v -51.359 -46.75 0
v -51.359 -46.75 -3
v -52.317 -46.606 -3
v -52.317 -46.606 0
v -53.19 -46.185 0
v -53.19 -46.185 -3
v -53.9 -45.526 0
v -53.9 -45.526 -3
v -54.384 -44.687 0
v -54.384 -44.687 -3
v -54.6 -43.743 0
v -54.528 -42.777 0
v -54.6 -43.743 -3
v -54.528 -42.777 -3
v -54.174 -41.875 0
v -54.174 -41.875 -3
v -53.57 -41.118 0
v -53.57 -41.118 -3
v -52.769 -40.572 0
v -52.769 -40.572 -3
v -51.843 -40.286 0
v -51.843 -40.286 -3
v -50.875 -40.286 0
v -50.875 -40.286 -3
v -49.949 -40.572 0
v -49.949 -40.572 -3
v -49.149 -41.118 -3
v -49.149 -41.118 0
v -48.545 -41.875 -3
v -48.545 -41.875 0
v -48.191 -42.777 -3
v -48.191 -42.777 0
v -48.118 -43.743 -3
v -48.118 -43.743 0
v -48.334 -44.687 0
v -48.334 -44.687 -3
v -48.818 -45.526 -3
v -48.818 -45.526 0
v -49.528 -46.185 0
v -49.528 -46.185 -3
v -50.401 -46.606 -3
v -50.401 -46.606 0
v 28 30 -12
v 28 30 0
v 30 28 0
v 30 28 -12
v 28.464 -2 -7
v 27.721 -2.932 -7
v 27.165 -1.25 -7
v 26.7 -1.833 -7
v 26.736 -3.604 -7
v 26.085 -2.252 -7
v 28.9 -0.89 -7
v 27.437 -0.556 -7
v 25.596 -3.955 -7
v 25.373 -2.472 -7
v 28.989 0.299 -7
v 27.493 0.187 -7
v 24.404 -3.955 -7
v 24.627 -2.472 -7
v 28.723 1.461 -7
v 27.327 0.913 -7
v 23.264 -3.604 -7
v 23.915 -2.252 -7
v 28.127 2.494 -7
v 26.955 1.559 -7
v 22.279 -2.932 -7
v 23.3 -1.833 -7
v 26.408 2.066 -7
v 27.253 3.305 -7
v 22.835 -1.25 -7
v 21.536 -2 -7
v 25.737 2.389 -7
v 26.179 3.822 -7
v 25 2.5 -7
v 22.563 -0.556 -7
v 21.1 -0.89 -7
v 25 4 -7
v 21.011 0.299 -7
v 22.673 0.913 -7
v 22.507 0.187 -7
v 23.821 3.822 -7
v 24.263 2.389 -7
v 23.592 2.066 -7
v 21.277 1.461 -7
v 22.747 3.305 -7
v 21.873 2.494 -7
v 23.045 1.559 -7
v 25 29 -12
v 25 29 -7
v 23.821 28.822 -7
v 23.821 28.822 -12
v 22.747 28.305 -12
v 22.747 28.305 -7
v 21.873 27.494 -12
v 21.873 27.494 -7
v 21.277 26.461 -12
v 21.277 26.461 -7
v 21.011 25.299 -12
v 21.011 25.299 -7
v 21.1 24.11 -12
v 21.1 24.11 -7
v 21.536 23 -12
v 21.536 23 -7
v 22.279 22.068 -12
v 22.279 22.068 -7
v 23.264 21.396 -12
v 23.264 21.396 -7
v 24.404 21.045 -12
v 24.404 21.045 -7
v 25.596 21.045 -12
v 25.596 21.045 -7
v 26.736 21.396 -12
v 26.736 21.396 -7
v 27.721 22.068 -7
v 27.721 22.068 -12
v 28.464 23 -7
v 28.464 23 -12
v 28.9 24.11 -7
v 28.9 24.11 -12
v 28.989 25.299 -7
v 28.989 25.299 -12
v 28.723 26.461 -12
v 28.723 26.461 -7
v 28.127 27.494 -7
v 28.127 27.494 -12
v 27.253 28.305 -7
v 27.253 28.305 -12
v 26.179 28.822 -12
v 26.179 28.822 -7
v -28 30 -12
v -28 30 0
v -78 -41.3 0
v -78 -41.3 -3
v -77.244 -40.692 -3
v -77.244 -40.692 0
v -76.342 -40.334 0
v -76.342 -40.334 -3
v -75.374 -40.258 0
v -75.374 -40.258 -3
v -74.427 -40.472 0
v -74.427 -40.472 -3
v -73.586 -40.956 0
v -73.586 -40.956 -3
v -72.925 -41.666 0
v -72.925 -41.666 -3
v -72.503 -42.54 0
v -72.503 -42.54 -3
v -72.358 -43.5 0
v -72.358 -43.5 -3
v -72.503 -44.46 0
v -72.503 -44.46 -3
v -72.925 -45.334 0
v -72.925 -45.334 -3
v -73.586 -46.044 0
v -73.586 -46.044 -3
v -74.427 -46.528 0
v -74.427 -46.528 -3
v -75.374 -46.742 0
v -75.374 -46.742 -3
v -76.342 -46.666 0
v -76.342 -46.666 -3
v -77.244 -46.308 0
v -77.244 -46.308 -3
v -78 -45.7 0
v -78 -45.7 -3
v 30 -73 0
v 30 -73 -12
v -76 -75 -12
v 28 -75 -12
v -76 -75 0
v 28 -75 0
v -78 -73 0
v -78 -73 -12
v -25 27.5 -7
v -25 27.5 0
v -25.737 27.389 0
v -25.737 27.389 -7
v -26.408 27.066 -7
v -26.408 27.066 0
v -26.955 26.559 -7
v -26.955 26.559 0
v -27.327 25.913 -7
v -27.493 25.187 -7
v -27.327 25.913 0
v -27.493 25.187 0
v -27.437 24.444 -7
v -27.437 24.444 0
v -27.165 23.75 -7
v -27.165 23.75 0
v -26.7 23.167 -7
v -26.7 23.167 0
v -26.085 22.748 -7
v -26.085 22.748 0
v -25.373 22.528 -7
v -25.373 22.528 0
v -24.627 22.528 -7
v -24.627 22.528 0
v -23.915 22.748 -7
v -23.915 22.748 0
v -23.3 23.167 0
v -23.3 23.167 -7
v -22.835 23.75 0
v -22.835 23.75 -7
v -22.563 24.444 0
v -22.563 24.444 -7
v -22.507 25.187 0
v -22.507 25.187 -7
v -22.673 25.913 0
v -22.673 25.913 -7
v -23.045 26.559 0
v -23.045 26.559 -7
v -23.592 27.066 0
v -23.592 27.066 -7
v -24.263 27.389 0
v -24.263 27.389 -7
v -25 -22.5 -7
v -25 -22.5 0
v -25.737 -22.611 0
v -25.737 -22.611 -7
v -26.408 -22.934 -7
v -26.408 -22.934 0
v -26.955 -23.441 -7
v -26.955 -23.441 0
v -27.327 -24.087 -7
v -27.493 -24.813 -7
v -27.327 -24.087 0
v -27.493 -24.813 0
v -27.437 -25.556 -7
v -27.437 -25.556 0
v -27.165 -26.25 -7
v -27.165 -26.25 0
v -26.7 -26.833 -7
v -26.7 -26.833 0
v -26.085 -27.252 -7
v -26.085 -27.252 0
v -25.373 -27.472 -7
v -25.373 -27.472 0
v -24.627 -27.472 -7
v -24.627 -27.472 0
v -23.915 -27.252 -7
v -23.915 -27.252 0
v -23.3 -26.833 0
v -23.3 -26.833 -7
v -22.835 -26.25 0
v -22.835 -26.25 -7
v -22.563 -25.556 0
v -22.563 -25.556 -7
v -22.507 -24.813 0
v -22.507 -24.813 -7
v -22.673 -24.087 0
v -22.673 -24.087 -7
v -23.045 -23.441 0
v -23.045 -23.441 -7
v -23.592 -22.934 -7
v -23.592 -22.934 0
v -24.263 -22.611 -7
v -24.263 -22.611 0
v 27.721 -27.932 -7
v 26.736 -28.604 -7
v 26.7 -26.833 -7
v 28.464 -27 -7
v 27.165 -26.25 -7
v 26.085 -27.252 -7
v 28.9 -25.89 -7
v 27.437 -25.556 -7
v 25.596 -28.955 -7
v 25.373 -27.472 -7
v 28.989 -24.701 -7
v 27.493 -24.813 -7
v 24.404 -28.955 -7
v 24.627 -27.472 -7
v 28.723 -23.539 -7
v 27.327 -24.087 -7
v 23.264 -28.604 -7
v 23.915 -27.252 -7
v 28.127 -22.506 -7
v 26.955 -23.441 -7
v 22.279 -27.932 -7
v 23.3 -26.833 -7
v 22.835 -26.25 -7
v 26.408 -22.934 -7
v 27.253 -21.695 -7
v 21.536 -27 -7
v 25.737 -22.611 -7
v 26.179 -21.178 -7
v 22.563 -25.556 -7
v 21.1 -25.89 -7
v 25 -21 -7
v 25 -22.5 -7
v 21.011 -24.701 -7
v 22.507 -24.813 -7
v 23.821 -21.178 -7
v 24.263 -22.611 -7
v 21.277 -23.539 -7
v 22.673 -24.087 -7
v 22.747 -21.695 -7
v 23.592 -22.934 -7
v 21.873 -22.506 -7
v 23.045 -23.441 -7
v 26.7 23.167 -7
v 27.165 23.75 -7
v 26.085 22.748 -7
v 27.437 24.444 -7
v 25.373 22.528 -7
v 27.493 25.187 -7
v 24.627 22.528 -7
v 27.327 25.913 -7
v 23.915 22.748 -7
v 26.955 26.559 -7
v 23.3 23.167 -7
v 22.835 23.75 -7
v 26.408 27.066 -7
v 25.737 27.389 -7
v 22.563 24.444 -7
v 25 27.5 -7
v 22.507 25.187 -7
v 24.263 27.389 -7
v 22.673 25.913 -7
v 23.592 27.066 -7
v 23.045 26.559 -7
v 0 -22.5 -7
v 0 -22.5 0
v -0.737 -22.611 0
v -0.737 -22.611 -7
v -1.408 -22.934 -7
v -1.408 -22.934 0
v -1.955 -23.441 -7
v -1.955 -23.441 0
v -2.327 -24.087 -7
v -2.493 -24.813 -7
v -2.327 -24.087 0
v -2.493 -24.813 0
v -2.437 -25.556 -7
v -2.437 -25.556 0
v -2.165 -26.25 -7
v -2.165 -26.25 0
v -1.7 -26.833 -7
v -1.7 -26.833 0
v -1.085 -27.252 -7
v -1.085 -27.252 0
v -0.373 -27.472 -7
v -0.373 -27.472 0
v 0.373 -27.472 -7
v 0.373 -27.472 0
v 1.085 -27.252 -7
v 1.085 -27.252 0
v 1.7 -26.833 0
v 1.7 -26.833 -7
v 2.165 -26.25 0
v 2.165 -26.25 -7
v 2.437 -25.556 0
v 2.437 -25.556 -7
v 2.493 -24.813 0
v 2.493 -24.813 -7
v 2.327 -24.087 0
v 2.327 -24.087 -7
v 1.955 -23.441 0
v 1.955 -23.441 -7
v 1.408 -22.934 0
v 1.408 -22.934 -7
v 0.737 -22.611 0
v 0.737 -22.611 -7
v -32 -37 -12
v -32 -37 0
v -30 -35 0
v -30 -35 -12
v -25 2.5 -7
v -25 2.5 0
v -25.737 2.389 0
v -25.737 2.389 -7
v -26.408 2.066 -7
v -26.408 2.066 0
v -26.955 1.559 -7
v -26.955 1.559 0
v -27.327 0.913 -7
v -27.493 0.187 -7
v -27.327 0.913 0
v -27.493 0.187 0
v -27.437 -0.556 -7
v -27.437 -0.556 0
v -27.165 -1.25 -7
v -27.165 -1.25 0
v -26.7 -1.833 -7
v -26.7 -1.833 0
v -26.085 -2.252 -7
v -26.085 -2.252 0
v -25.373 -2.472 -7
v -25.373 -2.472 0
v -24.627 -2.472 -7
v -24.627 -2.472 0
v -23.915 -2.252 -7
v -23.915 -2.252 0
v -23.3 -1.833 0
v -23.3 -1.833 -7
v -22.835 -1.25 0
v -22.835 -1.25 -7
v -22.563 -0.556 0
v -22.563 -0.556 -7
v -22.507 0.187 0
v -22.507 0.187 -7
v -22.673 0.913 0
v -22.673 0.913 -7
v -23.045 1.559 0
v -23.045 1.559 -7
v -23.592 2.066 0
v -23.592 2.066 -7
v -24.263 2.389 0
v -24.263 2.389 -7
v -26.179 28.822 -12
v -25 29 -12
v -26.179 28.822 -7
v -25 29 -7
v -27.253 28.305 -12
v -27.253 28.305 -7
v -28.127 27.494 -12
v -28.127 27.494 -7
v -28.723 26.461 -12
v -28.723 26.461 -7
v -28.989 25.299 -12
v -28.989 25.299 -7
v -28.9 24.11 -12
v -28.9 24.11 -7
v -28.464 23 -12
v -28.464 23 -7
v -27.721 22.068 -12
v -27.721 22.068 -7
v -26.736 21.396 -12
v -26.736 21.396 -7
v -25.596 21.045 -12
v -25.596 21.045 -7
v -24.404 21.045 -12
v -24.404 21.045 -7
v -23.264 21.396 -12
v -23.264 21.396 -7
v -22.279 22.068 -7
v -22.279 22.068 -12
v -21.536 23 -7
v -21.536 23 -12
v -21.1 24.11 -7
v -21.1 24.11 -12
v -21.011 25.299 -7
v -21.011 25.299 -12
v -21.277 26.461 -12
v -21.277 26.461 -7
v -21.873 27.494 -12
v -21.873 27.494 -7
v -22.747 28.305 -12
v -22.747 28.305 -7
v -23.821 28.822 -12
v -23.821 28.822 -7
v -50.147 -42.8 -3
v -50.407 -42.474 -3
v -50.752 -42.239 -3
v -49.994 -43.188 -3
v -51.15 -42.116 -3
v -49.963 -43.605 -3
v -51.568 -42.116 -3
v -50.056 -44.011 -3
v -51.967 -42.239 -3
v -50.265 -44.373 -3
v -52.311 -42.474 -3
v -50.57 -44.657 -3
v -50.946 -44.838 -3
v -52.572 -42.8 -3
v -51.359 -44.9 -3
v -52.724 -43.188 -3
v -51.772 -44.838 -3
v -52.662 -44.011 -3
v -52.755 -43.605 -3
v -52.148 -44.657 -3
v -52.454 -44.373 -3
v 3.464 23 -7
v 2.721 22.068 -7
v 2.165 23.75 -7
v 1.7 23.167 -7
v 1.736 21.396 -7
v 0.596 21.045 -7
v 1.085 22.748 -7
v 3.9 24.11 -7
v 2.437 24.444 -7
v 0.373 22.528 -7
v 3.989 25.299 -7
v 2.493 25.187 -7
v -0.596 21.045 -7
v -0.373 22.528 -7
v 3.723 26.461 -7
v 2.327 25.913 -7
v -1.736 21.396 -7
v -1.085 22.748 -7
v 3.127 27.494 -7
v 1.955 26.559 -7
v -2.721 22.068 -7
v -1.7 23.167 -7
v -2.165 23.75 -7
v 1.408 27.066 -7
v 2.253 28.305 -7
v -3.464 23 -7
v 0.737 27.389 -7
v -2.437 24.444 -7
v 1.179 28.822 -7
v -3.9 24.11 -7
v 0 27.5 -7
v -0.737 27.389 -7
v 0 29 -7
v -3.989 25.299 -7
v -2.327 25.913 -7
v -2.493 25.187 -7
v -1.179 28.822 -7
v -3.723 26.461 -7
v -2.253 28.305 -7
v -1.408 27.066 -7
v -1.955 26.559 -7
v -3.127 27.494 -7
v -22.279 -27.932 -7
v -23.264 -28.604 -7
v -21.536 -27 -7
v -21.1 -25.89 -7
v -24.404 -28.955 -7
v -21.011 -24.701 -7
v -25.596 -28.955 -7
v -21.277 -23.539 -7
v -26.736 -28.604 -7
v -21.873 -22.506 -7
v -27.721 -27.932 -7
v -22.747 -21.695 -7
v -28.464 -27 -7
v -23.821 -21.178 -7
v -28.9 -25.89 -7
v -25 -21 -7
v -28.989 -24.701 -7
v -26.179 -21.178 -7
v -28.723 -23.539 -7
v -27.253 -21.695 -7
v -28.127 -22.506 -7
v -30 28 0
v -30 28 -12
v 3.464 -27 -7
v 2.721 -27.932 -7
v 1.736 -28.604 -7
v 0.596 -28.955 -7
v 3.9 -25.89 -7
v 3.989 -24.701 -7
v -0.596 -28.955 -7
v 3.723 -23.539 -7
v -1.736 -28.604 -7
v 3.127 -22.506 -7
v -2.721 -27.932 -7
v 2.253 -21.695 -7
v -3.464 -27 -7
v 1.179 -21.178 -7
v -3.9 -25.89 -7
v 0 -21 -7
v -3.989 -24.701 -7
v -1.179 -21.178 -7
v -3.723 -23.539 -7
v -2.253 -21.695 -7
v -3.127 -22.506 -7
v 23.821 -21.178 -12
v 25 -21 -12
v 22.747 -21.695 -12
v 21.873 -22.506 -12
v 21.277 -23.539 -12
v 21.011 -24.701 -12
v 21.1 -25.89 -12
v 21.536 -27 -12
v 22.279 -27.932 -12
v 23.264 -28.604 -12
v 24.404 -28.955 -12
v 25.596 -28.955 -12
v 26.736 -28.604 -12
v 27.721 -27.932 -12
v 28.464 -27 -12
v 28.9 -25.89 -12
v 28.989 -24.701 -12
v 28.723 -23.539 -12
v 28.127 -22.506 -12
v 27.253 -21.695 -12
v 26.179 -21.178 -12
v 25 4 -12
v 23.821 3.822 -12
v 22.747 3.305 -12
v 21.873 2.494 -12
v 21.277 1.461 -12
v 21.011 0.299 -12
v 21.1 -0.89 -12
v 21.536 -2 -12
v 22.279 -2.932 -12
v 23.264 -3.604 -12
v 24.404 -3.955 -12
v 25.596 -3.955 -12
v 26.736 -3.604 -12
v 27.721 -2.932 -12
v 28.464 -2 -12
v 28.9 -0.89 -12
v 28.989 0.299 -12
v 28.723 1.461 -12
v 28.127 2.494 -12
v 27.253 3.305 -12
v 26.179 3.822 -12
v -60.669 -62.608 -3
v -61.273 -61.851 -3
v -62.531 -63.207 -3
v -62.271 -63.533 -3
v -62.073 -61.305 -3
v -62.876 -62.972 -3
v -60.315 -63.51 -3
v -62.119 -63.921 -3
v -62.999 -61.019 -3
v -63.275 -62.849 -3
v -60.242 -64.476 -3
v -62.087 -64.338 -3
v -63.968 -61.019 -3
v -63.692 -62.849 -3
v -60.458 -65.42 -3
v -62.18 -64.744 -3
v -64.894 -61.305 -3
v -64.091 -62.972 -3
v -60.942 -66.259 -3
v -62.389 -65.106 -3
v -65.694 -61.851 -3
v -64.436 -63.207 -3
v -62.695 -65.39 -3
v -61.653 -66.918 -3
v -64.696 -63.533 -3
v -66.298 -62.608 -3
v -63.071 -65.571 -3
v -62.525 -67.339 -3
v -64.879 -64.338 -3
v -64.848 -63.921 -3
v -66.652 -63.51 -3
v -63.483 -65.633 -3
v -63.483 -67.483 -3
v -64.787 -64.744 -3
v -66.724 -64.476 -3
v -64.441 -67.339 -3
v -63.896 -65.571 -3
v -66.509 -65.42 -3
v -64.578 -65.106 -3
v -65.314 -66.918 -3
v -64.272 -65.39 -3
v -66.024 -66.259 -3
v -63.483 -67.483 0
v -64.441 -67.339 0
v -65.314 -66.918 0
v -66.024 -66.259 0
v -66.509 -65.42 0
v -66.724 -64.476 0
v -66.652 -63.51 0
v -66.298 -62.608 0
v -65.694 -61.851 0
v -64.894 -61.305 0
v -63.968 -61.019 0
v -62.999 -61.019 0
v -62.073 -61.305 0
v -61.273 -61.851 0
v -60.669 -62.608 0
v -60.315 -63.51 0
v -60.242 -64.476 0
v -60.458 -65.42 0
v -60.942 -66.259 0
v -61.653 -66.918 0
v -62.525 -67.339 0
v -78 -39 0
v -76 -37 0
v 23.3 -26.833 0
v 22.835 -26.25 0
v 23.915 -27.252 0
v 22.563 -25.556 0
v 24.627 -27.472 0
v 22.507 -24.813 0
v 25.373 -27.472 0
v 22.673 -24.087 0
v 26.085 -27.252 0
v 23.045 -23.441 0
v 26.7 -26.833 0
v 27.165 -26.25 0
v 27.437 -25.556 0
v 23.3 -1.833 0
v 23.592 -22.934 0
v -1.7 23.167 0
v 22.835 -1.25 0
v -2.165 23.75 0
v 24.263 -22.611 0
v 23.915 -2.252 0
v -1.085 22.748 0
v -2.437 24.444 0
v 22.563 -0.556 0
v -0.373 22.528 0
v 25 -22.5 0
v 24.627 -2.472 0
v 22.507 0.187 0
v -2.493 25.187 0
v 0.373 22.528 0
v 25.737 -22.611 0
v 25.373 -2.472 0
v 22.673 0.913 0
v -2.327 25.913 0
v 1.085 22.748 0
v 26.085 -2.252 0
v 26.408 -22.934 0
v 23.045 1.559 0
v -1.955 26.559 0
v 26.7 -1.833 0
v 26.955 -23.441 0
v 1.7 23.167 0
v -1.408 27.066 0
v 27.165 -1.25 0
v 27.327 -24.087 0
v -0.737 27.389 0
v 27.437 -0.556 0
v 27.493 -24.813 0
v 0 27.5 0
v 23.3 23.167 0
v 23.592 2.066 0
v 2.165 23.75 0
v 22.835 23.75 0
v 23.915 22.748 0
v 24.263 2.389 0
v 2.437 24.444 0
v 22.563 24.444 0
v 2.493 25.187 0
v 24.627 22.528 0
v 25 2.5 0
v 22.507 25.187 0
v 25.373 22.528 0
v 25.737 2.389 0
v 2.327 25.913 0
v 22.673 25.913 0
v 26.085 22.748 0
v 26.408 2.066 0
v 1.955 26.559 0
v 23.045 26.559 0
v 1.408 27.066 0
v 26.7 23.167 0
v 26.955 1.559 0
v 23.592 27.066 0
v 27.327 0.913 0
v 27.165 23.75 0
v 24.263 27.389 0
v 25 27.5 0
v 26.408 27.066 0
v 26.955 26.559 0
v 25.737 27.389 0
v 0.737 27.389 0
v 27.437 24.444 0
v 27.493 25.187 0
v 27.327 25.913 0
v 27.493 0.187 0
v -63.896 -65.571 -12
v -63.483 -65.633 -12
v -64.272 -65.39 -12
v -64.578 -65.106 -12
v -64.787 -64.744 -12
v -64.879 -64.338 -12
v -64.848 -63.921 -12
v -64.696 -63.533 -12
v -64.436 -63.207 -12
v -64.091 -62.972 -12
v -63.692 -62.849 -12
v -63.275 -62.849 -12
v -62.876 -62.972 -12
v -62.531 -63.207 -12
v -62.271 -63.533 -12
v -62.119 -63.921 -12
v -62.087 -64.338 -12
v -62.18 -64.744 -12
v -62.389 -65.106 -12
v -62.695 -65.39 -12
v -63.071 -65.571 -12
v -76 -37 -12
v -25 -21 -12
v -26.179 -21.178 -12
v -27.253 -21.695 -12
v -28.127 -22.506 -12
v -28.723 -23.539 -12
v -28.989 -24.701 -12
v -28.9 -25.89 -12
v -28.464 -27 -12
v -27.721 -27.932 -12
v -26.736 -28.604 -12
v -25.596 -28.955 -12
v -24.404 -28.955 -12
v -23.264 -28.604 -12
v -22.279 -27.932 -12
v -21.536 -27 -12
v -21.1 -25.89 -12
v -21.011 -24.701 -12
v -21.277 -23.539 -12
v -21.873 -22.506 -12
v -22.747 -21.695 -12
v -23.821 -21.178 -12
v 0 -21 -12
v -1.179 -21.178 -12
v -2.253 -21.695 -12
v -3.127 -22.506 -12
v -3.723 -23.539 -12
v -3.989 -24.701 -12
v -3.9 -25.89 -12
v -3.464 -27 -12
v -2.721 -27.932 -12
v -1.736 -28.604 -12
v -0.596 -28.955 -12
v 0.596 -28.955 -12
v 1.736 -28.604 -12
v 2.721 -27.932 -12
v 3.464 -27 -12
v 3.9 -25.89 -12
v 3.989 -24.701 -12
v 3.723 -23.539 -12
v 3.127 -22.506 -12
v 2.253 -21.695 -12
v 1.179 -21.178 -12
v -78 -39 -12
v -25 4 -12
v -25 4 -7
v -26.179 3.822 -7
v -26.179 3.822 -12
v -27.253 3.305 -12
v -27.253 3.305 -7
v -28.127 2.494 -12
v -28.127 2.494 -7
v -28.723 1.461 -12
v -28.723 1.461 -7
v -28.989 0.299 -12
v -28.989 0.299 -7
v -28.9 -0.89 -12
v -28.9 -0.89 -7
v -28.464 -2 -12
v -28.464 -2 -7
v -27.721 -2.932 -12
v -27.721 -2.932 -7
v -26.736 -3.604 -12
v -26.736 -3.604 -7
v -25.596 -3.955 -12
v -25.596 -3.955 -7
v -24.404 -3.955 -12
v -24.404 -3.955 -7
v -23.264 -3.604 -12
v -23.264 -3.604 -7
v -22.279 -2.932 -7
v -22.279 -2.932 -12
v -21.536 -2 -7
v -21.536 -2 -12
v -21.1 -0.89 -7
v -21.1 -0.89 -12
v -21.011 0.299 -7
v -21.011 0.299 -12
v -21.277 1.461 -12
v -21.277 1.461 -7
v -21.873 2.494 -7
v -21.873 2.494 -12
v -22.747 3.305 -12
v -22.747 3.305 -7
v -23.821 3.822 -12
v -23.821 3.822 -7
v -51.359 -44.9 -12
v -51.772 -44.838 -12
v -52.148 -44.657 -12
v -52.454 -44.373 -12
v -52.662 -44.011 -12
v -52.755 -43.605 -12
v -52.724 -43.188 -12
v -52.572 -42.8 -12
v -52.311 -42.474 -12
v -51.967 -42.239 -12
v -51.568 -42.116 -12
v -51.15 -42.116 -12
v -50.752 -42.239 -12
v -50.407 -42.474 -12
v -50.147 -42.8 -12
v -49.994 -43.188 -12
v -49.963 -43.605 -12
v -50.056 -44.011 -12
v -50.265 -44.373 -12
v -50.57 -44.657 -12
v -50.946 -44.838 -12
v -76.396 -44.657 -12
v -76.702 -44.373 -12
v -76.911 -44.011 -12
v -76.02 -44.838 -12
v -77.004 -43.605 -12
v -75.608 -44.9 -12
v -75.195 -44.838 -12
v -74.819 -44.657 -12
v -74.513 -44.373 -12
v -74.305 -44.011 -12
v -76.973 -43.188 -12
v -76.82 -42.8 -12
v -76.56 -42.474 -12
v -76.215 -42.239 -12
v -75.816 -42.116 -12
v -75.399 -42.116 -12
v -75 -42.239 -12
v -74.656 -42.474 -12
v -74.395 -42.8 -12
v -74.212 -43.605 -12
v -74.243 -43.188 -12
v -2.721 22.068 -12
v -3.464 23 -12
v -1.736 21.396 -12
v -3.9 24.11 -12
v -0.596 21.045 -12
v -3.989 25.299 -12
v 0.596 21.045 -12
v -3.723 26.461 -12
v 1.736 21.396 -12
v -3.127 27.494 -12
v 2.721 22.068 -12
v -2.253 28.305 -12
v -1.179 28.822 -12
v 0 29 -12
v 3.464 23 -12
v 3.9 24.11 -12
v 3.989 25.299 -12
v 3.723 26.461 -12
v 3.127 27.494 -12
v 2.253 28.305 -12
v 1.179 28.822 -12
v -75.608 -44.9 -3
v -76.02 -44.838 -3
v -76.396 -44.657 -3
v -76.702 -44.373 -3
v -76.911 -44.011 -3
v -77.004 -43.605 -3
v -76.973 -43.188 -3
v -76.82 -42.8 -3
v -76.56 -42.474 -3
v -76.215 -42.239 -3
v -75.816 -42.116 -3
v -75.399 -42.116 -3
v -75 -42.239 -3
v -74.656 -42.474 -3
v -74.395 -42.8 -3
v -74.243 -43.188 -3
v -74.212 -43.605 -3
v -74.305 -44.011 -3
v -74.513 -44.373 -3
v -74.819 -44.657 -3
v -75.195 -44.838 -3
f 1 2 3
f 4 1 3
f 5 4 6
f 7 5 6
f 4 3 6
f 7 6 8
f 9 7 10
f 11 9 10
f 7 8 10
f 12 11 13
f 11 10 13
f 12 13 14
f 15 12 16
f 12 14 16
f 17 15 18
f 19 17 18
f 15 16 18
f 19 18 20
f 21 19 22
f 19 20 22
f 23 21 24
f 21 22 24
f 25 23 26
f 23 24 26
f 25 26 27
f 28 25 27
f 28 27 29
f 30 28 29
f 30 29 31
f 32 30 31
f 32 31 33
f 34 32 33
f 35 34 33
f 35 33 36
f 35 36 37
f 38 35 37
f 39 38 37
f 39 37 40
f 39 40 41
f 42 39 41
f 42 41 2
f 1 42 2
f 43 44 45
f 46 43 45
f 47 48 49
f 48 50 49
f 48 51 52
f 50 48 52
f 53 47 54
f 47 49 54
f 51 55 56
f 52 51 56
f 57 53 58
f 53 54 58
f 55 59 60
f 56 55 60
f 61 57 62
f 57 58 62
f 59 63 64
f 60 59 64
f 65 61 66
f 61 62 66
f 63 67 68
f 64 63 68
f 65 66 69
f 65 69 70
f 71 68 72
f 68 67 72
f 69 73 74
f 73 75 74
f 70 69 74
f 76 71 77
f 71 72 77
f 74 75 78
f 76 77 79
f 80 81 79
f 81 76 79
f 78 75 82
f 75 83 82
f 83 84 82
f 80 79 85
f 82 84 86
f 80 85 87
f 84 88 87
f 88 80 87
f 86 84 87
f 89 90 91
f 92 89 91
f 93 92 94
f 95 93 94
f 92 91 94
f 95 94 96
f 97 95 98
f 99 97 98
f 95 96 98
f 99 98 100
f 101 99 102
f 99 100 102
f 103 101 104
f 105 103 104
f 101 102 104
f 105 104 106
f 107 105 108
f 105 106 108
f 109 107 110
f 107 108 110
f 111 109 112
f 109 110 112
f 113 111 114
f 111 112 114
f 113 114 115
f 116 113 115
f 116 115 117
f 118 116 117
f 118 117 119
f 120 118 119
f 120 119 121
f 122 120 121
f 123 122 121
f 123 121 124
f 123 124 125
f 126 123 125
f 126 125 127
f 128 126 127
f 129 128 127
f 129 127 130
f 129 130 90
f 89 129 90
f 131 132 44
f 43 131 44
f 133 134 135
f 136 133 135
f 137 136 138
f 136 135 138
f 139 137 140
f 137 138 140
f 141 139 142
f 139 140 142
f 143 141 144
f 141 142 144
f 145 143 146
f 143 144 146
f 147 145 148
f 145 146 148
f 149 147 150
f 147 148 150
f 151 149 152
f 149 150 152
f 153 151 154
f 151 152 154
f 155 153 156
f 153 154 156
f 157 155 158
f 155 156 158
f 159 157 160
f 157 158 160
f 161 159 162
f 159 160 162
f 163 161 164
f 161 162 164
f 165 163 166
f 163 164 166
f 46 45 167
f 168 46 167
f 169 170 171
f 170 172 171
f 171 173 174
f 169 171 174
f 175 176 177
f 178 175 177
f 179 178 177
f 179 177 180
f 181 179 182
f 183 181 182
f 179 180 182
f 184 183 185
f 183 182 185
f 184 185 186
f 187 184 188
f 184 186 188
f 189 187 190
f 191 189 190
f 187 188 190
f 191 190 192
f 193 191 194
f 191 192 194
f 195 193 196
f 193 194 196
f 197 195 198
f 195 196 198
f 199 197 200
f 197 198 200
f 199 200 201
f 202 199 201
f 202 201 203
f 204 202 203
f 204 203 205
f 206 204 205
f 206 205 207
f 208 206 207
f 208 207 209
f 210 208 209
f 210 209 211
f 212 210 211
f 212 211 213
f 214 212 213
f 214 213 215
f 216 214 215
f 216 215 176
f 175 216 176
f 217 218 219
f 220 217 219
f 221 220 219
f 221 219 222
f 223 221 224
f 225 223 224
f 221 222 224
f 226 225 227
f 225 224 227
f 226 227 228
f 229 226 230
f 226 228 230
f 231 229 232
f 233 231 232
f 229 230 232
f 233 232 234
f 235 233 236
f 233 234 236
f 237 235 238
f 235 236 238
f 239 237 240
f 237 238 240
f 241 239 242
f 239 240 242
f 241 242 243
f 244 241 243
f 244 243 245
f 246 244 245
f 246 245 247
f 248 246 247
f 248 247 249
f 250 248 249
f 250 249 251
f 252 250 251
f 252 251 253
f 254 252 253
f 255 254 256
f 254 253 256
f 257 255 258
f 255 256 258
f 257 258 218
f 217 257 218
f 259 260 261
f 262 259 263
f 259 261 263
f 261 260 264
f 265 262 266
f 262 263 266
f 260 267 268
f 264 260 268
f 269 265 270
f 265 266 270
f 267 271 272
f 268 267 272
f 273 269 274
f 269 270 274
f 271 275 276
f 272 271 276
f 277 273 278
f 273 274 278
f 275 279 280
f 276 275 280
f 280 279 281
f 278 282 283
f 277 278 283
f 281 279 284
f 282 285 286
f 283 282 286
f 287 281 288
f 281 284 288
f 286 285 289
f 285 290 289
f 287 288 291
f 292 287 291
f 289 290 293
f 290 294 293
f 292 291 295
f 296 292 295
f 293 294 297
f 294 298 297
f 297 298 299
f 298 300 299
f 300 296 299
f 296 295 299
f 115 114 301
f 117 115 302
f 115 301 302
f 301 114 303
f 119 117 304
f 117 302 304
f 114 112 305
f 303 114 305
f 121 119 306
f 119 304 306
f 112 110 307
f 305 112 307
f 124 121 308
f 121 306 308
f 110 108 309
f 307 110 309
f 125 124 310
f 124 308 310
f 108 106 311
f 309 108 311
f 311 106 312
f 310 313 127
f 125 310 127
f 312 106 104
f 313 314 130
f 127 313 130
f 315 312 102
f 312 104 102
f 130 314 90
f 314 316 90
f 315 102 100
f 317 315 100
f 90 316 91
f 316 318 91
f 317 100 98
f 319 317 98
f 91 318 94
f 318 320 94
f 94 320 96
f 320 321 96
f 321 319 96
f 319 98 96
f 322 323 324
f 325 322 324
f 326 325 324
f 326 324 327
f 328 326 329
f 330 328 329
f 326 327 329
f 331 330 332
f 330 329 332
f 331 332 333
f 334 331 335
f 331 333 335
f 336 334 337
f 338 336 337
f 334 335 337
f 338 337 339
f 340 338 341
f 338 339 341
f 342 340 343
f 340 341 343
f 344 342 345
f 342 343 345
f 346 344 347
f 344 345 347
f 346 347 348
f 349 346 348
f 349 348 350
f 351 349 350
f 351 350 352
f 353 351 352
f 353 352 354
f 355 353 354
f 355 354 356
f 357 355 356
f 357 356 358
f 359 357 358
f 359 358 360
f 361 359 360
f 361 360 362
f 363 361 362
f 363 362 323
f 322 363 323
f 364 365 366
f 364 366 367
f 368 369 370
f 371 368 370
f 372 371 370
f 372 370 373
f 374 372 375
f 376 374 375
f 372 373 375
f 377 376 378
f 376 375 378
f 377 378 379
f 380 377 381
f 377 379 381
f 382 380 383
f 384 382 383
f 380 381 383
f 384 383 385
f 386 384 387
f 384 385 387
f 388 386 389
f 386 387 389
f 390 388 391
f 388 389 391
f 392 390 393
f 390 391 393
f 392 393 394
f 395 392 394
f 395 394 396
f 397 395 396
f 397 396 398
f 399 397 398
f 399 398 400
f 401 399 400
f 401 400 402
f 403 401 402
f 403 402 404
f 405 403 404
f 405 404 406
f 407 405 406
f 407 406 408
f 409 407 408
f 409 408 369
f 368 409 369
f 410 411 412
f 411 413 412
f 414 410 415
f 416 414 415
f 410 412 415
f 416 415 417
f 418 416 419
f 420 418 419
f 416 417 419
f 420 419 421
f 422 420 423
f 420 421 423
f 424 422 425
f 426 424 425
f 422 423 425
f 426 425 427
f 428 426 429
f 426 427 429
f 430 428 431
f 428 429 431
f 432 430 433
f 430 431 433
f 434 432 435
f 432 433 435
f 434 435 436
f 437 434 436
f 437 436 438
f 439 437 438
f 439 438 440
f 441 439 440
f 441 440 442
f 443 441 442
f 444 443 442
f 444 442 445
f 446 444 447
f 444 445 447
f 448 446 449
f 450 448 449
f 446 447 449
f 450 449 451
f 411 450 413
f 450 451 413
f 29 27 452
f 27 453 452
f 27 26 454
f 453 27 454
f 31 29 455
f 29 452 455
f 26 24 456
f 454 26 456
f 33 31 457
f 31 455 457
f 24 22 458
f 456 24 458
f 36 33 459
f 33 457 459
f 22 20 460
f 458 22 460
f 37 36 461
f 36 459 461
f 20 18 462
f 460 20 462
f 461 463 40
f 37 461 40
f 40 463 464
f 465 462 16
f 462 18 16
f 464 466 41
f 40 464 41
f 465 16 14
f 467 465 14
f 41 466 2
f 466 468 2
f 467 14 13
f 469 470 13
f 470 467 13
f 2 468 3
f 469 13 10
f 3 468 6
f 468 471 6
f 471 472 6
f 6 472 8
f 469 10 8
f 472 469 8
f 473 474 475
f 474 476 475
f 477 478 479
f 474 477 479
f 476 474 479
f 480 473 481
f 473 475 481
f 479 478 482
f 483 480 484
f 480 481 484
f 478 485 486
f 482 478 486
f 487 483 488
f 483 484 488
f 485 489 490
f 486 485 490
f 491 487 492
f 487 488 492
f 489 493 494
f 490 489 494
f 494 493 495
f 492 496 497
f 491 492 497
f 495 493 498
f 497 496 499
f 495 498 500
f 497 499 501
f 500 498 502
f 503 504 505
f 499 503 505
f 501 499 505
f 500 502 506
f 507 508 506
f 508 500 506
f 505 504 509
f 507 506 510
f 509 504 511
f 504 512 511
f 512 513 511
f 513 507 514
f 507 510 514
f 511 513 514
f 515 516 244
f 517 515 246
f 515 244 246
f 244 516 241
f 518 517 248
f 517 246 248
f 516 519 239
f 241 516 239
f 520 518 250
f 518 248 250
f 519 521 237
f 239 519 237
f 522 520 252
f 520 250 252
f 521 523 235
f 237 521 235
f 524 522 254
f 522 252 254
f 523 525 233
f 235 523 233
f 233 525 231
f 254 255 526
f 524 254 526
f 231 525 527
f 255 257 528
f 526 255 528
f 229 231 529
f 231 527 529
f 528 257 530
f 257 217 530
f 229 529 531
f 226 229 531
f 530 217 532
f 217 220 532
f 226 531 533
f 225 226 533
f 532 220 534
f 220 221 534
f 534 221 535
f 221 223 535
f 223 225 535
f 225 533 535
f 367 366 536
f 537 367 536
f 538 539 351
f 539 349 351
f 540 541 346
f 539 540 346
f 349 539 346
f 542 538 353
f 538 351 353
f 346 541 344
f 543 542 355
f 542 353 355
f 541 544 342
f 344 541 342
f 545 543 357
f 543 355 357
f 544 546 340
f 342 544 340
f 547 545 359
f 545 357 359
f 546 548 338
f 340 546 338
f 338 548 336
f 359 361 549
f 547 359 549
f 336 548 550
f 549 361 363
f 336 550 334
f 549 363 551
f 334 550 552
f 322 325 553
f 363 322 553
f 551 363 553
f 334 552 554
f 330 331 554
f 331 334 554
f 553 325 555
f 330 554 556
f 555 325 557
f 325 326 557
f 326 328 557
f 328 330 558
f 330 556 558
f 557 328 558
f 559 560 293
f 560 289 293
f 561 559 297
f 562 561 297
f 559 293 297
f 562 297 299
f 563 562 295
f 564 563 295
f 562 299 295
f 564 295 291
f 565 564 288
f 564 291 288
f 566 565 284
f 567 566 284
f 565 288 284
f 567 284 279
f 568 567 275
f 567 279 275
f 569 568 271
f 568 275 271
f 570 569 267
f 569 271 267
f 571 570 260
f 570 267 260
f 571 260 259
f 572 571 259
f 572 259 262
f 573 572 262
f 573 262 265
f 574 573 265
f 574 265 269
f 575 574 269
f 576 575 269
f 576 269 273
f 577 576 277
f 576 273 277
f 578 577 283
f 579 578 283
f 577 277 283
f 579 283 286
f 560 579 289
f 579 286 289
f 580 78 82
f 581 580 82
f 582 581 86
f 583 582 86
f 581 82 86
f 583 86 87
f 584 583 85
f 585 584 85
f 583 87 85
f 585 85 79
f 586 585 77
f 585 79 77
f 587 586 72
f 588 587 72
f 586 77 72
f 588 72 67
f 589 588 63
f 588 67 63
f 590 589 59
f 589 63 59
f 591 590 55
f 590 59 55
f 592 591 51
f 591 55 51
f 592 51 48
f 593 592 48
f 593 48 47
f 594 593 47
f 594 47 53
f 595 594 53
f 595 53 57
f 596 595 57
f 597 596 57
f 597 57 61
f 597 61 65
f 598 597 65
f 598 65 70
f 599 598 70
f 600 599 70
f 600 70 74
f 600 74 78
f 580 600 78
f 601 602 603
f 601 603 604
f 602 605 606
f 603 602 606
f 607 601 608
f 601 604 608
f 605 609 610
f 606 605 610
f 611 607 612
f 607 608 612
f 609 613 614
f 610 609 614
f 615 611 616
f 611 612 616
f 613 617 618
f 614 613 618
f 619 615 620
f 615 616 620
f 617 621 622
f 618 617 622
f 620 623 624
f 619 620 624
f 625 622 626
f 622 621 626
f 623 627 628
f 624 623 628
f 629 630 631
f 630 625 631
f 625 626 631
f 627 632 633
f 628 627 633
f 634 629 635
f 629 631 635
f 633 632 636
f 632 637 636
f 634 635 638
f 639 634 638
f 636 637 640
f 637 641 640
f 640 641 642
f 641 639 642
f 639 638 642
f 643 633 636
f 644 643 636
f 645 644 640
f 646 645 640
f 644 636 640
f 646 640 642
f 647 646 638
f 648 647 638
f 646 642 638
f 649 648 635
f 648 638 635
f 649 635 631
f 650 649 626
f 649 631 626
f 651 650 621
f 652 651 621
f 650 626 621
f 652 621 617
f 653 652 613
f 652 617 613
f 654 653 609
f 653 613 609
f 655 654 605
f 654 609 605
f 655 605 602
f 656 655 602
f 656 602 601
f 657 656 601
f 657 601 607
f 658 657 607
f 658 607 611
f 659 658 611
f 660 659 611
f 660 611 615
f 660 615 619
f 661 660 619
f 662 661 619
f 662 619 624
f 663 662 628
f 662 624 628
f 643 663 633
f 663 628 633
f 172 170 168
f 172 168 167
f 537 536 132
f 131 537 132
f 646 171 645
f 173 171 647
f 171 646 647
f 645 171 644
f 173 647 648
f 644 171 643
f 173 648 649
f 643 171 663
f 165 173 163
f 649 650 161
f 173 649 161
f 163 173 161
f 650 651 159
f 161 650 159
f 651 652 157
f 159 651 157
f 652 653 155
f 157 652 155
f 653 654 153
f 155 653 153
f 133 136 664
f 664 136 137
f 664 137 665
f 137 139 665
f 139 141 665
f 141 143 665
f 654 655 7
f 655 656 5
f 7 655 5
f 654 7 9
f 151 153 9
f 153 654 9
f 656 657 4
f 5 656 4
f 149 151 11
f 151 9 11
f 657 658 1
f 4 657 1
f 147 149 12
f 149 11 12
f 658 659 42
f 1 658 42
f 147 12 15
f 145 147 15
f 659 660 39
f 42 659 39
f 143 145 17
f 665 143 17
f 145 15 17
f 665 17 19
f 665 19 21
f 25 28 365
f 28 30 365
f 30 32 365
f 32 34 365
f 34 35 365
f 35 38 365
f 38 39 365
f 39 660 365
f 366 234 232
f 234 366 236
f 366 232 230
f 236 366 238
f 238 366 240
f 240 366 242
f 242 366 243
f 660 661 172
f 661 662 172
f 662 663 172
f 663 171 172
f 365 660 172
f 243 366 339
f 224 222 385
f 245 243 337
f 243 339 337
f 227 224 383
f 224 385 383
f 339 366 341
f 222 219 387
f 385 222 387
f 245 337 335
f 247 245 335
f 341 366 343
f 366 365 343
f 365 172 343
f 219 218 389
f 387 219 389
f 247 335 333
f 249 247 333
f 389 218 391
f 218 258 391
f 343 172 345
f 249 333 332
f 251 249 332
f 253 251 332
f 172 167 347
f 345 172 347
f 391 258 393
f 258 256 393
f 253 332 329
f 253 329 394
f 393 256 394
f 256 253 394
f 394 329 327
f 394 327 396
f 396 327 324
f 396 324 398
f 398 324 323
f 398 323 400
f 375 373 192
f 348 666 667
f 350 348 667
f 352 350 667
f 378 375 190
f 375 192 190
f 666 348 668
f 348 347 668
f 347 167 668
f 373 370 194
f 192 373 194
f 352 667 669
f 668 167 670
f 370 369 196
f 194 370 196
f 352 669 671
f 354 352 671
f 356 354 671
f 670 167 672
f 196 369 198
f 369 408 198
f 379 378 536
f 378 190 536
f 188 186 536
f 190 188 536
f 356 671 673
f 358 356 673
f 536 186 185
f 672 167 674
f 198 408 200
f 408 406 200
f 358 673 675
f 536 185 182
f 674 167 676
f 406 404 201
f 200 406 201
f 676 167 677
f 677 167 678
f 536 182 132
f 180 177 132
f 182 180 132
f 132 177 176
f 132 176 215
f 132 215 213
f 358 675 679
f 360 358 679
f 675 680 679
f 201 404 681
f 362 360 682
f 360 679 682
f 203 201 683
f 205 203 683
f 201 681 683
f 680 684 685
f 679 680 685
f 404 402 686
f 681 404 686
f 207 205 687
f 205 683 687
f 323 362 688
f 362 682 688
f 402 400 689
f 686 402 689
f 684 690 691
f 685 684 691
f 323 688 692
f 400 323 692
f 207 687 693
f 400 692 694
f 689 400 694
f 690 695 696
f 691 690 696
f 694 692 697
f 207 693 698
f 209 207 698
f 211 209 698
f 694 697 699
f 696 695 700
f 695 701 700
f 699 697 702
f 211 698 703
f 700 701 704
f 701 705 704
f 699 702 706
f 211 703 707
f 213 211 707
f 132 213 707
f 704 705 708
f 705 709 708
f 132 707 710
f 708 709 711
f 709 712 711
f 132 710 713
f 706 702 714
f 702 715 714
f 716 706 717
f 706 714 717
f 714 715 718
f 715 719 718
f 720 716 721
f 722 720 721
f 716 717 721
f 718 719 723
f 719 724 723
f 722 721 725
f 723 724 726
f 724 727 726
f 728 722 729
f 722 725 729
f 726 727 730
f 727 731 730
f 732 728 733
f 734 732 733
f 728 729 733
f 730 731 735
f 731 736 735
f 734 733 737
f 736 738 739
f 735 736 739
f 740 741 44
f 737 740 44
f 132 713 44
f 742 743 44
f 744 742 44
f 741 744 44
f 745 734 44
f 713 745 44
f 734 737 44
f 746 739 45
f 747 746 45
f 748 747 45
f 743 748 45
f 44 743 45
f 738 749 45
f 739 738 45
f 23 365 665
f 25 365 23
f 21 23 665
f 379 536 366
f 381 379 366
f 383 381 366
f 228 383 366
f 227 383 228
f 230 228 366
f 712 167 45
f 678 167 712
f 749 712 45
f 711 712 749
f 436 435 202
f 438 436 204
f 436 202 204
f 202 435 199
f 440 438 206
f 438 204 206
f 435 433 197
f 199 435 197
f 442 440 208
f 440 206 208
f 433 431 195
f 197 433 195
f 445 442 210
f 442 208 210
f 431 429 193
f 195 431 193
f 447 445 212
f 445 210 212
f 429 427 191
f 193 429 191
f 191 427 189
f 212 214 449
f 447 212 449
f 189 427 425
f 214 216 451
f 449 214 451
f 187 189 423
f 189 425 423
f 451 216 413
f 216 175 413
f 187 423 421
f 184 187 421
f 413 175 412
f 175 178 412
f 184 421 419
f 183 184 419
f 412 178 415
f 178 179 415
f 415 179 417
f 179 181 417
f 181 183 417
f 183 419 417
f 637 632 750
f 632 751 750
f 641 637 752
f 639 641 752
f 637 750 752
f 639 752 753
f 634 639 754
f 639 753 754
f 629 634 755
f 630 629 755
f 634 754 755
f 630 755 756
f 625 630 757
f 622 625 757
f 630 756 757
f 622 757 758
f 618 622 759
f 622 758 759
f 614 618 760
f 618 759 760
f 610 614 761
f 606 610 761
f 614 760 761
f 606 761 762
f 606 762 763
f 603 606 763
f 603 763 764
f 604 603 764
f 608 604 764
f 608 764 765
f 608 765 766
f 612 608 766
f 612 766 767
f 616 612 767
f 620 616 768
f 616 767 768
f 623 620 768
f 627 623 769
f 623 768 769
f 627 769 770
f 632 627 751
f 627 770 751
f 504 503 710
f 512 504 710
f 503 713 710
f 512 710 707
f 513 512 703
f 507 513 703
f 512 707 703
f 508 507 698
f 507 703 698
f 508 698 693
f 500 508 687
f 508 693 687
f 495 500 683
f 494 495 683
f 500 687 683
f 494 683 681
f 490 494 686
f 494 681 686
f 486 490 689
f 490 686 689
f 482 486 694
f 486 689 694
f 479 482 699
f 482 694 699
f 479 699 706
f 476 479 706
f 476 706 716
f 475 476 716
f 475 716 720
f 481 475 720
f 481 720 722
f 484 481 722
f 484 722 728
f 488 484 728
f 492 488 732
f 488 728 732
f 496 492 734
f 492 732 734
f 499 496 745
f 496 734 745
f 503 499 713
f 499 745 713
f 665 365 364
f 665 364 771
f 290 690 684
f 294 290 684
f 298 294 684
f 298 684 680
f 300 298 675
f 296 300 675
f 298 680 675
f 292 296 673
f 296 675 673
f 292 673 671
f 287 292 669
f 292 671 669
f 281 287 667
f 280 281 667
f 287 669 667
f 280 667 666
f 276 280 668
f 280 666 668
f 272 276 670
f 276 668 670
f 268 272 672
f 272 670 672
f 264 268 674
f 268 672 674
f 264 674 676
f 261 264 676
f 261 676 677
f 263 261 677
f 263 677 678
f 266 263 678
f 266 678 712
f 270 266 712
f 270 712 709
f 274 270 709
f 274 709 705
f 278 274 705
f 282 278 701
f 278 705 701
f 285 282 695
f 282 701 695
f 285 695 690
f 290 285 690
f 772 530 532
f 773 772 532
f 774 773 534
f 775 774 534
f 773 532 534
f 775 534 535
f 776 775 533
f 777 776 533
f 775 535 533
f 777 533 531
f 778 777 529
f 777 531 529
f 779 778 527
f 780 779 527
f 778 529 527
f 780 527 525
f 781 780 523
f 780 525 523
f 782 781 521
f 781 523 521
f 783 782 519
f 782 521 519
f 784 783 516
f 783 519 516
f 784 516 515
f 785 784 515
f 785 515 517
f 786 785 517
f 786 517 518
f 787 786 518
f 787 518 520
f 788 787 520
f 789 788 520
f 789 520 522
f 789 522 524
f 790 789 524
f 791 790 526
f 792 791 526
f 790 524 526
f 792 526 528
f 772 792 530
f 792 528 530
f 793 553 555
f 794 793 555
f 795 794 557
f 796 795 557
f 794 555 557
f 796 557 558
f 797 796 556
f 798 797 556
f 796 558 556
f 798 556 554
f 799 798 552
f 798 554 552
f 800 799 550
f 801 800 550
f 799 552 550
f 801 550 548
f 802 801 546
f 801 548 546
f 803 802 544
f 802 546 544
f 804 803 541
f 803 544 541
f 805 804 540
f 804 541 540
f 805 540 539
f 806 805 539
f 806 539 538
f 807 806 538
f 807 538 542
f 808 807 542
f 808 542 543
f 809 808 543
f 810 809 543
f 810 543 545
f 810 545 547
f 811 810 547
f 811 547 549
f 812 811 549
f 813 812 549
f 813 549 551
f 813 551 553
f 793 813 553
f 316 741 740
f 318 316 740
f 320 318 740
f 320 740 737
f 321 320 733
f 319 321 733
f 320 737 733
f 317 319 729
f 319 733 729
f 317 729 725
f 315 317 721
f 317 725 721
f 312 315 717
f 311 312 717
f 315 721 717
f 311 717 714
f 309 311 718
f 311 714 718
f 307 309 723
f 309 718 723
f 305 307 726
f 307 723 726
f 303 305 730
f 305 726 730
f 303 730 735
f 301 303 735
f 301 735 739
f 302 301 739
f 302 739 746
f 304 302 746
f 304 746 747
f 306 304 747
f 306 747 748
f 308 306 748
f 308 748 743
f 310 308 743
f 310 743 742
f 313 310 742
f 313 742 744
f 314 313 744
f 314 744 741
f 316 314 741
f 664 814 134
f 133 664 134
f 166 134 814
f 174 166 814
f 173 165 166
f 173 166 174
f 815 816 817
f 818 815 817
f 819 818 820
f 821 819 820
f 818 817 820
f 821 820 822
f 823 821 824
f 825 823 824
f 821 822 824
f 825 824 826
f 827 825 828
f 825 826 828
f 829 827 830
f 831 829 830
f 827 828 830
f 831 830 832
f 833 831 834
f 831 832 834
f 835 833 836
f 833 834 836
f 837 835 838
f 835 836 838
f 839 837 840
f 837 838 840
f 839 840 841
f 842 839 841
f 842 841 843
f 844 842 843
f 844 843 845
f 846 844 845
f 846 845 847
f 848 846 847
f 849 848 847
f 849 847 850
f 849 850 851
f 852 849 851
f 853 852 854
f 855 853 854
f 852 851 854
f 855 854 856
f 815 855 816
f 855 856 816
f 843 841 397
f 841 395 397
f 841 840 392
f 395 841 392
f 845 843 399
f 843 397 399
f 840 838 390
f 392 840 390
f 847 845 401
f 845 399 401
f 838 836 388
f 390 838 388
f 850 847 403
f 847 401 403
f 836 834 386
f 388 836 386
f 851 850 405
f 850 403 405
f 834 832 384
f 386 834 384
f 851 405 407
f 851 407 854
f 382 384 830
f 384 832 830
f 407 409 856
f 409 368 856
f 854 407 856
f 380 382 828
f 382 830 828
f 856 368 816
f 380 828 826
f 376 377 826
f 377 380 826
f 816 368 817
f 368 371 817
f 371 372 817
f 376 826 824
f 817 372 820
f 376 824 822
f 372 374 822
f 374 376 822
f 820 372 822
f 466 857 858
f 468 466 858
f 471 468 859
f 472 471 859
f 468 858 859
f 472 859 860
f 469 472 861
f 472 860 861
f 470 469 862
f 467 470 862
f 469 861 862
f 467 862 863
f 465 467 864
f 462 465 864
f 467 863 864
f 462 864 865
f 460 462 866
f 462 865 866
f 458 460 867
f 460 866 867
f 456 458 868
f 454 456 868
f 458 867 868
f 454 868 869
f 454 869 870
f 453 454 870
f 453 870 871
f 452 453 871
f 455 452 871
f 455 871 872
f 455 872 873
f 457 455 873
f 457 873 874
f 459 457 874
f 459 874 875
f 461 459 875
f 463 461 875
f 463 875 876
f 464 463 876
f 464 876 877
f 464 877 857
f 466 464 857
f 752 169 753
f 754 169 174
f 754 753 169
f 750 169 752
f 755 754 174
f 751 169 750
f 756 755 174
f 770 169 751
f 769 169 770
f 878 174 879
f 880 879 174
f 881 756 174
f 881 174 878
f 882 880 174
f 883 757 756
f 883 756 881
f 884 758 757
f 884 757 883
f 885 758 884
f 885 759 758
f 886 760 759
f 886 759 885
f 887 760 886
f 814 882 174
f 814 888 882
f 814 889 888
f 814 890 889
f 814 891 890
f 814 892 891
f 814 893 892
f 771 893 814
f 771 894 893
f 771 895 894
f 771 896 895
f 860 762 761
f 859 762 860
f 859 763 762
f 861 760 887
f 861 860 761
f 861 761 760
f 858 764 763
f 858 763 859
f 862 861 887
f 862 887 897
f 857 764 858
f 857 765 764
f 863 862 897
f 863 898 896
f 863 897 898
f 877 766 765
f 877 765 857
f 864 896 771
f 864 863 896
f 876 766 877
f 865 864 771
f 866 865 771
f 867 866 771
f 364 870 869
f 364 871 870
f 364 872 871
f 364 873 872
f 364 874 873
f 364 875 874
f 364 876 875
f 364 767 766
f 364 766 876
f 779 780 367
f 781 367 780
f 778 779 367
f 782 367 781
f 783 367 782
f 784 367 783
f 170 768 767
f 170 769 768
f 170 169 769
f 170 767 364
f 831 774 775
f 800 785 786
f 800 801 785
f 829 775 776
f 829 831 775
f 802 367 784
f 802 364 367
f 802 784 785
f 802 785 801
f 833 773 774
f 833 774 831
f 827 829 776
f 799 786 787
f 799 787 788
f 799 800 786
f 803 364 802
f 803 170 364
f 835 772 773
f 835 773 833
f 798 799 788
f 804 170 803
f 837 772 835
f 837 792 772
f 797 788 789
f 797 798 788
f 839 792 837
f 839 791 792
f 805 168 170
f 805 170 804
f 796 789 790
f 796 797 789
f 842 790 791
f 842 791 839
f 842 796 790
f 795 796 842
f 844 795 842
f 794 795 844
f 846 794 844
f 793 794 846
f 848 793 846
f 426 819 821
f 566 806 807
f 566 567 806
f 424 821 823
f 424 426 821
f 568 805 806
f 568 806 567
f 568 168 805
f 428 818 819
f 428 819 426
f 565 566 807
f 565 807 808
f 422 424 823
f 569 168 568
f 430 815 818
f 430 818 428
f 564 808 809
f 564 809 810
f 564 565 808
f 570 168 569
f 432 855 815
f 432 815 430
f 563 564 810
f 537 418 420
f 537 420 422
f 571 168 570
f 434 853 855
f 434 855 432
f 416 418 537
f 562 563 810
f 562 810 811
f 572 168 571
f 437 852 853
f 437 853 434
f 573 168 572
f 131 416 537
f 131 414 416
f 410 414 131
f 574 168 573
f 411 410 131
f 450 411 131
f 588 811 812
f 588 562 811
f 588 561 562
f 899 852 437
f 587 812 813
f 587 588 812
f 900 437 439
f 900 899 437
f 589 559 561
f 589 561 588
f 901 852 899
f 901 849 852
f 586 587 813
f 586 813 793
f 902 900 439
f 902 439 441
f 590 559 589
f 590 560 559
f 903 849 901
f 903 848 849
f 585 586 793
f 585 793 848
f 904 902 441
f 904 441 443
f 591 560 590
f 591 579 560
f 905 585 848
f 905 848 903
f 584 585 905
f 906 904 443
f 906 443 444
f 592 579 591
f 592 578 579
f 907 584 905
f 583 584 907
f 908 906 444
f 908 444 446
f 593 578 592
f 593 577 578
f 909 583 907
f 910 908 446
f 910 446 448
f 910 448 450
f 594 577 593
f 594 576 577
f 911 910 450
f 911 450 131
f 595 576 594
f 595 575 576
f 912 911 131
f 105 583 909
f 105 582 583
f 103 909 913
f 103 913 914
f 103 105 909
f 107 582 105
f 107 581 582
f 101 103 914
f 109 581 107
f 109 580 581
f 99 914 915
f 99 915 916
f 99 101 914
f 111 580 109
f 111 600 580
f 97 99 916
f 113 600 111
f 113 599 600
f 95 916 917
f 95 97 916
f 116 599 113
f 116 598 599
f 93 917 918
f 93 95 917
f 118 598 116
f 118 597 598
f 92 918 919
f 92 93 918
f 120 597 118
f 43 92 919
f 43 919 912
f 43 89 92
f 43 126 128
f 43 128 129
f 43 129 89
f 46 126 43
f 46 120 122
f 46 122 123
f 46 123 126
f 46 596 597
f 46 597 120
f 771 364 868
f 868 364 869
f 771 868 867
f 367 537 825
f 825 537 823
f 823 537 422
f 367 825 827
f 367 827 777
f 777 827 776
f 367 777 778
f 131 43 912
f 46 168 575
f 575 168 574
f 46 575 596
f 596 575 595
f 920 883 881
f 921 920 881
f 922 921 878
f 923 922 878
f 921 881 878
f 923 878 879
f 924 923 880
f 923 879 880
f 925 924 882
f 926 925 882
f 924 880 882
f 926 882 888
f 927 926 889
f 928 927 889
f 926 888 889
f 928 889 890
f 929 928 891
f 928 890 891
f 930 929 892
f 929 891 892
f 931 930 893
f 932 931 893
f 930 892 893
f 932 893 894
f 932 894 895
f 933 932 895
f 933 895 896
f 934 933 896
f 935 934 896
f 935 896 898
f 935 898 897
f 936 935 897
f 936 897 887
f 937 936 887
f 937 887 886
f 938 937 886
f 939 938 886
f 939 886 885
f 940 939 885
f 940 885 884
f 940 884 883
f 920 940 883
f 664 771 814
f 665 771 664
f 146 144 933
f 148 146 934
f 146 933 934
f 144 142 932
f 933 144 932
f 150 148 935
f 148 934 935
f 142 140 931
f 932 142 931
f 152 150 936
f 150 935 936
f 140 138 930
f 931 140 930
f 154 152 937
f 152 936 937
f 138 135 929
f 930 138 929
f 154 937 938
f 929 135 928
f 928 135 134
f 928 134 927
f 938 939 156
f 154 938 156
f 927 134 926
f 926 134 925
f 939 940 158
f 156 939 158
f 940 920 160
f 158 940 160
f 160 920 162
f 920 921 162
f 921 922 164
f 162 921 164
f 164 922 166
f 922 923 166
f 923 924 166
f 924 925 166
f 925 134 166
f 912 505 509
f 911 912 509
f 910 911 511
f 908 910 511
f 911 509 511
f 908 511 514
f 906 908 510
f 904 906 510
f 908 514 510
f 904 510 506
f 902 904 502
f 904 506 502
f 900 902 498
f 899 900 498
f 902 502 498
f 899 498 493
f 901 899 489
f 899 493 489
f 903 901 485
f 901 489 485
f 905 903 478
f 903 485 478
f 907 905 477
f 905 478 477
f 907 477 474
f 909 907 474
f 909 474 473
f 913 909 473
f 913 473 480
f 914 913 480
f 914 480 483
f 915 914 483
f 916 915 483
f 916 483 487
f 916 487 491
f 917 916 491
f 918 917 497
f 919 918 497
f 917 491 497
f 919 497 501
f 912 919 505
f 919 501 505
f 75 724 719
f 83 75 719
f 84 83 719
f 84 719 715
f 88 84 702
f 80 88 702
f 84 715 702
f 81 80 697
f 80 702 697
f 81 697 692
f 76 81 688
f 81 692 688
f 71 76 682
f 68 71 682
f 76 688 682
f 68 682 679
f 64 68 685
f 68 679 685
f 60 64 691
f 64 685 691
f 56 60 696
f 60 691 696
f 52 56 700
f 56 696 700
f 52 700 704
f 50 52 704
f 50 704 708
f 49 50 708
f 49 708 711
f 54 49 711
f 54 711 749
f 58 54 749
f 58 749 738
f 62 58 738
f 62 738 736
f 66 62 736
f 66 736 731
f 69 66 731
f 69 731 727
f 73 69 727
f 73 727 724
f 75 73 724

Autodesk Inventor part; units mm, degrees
ref_plane "YZ Plane" through (0, 0, 0) normal (1, 0, 0) x (0, 1, 0)
ref_plane "XZ Plane" through (0, 0, 0) normal (0, 1, 0) x (-1, 0, 0)
ref_plane "XY Plane" through (0, 0, 0) normal (0, 0, 1) x (1, 0, 0)
ref_plane "Arbeitsebene2" through (0, 0, 0) normal (0, 0, -1) x (0, 1, 0)
sketch "Skizze6" plane through (0, 0, 0) normal (0, 0, -1) x (0, 1, 0)
  circle A0 centre (0, 25) radius 1.95 projected
  circle A1 centre (-25, 0) radius 1.95 projected
  circle A2 centre (-25, -25) radius 1.95 projected
  circle A3 centre (25, 25) radius 1.95 projected
  circle A4 centre (25, -25) radius 1.95 projected
  circle A5 centre (-25, 25) radius 1.95 projected
  circle A6 centre (25, 0) radius 1.95 projected
  circle A7 centre (0, -25) radius 1.95 projected
  line L0 (-28, 30) -> (-30, 28) projected
  line L1 (-30, 28) -> (-30, -28) projected
  line L2 (-30, -28) -> (-28, -30) projected
  line L3 (-28, -30) -> (28, -30) projected
  line L4 (28, -30) -> (30, -28) projected
  line L5 (30, -28) -> (30, 28) projected
  line L6 (30, 28) -> (28, 30) projected
  line L7 (28, 30) -> (-28, 30) projected
  line L8 (-40.5166, -48.4344) -> (-70.5166, -48.4344) construction
  line L9 (-70.5166, -48.4344) -> (-70.5166, -78.4344) construction
  line L10 (-70.5166, -78.4344) -> (-40.5166, -78.4344) construction
  line L11 (-40.5166, -78.4344) -> (-40.5166, -48.4344) construction
  line L12 (-40.5166, -48.4344) -> (-70.5166, -78.4344) construction
  line L13 (-70.5166, -48.4344) -> (-40.5166, -78.4344) construction
  line L14 (-75, -48) -> (-45, -48)
  line L15 (-45, -48) -> (-45, -78)
  line L16 (-45, -78) -> (-75, -78)
  line L17 (-75, -78) -> (-75, -48)
  line L18 (-75, -48) -> (-45, -78) construction
  line L19 (-45, -48) -> (-75, -78) construction
  line L20 (-45, -48) -> (-30, -48)
  line L21 (-30, -48) -> (-30, -28)
  line L22 (-45, -78) -> (0, -78)
  line L23 (0, -78) -> (0, -30)
  circle A8 centre (-55.5095, -63.317) radius 8.4793 projected
  line L24 (-28, 30) -> (-75, 30)
  line L25 (-75, 30) -> (-75, -48)
  line L26 (-28, -30) -> (-45, -30)
  line L27 (-45, -30) -> (-45, -48)
  line L28 (-45, -78) -> (-37, -78)
  line L29 (-37, -78) -> (-37, -48)
  line L30 (-37, -48) -> (-45, -48)
  line L31 (-45, -48) -> (-45, -78)
  line L32 (-45, -30) -> (-37, -30)
  line L33 (-37, -30) -> (-37, -48)
  line L34 (-37, -48) -> (-45, -48)
  line L35 (-45, -48) -> (-45, -30)
  point P0 (0, 0)
  point P1 (-55.5166, -63.4344)
  point P2 (-60, -63)
  dimension "d10" = 30
  dimension "d11" = 30
  dimension "d12" = 30
  dimension "d13" = 30
  dimension "d14" = 45
  dimension "d15" = 18
  dimension "d28" = 8
extrude "Extrusion1" add sketch "Skizze6" along normal blind 12 contours L7 L6 L5 L4 L3 L2 L1 L0 | L0 L1 L21 L26 L27 L14 L25 L24 | L2 L26 L21 | L14 L15 L16 L17 | L20 L29 L22 L15 | L27 L26 L33 L20 | A8
chamfer "Fase1" distance 2 angle 45 4 edges at (-78, -75, -6) (30, -75, -6) (-30, -37, -6) (-78, -37, -6)
sketch "Skizze7" plane through (0, 0, -12) normal (0, 0, -1) x (-1, 0, 0)
  line L0 (30, -35) -> (30, 28) projected
  line L1 (30, 28) -> (28, 30) projected
  line L2 (28, 30) -> (-28, 30) projected
  line L3 (-28, 30) -> (-30, 28) projected
  line L4 (-30, 28) -> (-30, -73) projected
  circle A0 centre (25, 0) radius 1.95 projected
  circle A1 centre (0, 25) radius 1.95 projected
  circle A2 centre (-25, -25) radius 1.95 projected
  circle A3 centre (25, 25) radius 1.95 projected
  circle A4 centre (-25, 25) radius 1.95 projected
  circle A5 centre (25, -25) radius 1.95 projected
  circle A6 centre (0, -25) radius 1.95 projected
  circle A7 centre (-25, 0) radius 1.95 projected
  line L5 (78, -73) -> (76, -75) projected
  line L6 (-28, -75) -> (76, -75) projected
  line L7 (-28, -75) -> (-30, -73) projected
  line L8 (78, -73) -> (78, -39) projected
  line L9 (76, -37) -> (32, -37) projected
  line L10 (76, -37) -> (78, -39) projected
  line L11 (30, -35) -> (32, -37) projected
  point P0 (0, 0)
hole "Bohrung2" at (-25, 25, -12) at (-25, 0, -12) at (-25, -25, -12) at (25, -25, -12) at (25, 0, -12) at (25, 25, -12) at (0, 25, -12) at (0, -25, -12) direction (0, 0, 1) diameter 5 end through all counterbore diameter 8 counterbore depth 5
sketch "Skizze8" plane through (0, 0, 0) normal (0, 0, 1) x (1, 0, 0)
  circle A0 centre (-63.4834, -64.233) radius 2.95 projected
  circle A1 centre (-75.6078, -43.5) radius 2.95 projected
  circle A2 centre (-51.3591, -43.5) radius 2.95 projected
  point P0 (0, 0)
hole "Bohrung3" at (-51.3591, -43.5, 0) at (-63.4834, -64.233, 0) at (-75.6078, -43.5, 0) direction (0, 0, -1) diameter 2.8 end through all counterbore diameter 6.5 counterbore depth 3
equation "\"BendRadius\" = Thickness"
equation "\"BendReliefWidth\" = Thickness"
equation "\"BendReliefDepth\" = 0.5 * Thickness"
equation "\"CornerReliefSize\" = 4 * Thickness"
equation "\"MinimumRemnant\" = 2 * Thickness"
equation "\"TransitionRadius\" = BendRadius"
equation "\"JacobiRadiusSize\" = Thickness"
equation "\"GapSize\" = Thickness"
equation "\"Thickness\" = 0.5"
properties part number "cellSTORM_Base_v0_R1"
